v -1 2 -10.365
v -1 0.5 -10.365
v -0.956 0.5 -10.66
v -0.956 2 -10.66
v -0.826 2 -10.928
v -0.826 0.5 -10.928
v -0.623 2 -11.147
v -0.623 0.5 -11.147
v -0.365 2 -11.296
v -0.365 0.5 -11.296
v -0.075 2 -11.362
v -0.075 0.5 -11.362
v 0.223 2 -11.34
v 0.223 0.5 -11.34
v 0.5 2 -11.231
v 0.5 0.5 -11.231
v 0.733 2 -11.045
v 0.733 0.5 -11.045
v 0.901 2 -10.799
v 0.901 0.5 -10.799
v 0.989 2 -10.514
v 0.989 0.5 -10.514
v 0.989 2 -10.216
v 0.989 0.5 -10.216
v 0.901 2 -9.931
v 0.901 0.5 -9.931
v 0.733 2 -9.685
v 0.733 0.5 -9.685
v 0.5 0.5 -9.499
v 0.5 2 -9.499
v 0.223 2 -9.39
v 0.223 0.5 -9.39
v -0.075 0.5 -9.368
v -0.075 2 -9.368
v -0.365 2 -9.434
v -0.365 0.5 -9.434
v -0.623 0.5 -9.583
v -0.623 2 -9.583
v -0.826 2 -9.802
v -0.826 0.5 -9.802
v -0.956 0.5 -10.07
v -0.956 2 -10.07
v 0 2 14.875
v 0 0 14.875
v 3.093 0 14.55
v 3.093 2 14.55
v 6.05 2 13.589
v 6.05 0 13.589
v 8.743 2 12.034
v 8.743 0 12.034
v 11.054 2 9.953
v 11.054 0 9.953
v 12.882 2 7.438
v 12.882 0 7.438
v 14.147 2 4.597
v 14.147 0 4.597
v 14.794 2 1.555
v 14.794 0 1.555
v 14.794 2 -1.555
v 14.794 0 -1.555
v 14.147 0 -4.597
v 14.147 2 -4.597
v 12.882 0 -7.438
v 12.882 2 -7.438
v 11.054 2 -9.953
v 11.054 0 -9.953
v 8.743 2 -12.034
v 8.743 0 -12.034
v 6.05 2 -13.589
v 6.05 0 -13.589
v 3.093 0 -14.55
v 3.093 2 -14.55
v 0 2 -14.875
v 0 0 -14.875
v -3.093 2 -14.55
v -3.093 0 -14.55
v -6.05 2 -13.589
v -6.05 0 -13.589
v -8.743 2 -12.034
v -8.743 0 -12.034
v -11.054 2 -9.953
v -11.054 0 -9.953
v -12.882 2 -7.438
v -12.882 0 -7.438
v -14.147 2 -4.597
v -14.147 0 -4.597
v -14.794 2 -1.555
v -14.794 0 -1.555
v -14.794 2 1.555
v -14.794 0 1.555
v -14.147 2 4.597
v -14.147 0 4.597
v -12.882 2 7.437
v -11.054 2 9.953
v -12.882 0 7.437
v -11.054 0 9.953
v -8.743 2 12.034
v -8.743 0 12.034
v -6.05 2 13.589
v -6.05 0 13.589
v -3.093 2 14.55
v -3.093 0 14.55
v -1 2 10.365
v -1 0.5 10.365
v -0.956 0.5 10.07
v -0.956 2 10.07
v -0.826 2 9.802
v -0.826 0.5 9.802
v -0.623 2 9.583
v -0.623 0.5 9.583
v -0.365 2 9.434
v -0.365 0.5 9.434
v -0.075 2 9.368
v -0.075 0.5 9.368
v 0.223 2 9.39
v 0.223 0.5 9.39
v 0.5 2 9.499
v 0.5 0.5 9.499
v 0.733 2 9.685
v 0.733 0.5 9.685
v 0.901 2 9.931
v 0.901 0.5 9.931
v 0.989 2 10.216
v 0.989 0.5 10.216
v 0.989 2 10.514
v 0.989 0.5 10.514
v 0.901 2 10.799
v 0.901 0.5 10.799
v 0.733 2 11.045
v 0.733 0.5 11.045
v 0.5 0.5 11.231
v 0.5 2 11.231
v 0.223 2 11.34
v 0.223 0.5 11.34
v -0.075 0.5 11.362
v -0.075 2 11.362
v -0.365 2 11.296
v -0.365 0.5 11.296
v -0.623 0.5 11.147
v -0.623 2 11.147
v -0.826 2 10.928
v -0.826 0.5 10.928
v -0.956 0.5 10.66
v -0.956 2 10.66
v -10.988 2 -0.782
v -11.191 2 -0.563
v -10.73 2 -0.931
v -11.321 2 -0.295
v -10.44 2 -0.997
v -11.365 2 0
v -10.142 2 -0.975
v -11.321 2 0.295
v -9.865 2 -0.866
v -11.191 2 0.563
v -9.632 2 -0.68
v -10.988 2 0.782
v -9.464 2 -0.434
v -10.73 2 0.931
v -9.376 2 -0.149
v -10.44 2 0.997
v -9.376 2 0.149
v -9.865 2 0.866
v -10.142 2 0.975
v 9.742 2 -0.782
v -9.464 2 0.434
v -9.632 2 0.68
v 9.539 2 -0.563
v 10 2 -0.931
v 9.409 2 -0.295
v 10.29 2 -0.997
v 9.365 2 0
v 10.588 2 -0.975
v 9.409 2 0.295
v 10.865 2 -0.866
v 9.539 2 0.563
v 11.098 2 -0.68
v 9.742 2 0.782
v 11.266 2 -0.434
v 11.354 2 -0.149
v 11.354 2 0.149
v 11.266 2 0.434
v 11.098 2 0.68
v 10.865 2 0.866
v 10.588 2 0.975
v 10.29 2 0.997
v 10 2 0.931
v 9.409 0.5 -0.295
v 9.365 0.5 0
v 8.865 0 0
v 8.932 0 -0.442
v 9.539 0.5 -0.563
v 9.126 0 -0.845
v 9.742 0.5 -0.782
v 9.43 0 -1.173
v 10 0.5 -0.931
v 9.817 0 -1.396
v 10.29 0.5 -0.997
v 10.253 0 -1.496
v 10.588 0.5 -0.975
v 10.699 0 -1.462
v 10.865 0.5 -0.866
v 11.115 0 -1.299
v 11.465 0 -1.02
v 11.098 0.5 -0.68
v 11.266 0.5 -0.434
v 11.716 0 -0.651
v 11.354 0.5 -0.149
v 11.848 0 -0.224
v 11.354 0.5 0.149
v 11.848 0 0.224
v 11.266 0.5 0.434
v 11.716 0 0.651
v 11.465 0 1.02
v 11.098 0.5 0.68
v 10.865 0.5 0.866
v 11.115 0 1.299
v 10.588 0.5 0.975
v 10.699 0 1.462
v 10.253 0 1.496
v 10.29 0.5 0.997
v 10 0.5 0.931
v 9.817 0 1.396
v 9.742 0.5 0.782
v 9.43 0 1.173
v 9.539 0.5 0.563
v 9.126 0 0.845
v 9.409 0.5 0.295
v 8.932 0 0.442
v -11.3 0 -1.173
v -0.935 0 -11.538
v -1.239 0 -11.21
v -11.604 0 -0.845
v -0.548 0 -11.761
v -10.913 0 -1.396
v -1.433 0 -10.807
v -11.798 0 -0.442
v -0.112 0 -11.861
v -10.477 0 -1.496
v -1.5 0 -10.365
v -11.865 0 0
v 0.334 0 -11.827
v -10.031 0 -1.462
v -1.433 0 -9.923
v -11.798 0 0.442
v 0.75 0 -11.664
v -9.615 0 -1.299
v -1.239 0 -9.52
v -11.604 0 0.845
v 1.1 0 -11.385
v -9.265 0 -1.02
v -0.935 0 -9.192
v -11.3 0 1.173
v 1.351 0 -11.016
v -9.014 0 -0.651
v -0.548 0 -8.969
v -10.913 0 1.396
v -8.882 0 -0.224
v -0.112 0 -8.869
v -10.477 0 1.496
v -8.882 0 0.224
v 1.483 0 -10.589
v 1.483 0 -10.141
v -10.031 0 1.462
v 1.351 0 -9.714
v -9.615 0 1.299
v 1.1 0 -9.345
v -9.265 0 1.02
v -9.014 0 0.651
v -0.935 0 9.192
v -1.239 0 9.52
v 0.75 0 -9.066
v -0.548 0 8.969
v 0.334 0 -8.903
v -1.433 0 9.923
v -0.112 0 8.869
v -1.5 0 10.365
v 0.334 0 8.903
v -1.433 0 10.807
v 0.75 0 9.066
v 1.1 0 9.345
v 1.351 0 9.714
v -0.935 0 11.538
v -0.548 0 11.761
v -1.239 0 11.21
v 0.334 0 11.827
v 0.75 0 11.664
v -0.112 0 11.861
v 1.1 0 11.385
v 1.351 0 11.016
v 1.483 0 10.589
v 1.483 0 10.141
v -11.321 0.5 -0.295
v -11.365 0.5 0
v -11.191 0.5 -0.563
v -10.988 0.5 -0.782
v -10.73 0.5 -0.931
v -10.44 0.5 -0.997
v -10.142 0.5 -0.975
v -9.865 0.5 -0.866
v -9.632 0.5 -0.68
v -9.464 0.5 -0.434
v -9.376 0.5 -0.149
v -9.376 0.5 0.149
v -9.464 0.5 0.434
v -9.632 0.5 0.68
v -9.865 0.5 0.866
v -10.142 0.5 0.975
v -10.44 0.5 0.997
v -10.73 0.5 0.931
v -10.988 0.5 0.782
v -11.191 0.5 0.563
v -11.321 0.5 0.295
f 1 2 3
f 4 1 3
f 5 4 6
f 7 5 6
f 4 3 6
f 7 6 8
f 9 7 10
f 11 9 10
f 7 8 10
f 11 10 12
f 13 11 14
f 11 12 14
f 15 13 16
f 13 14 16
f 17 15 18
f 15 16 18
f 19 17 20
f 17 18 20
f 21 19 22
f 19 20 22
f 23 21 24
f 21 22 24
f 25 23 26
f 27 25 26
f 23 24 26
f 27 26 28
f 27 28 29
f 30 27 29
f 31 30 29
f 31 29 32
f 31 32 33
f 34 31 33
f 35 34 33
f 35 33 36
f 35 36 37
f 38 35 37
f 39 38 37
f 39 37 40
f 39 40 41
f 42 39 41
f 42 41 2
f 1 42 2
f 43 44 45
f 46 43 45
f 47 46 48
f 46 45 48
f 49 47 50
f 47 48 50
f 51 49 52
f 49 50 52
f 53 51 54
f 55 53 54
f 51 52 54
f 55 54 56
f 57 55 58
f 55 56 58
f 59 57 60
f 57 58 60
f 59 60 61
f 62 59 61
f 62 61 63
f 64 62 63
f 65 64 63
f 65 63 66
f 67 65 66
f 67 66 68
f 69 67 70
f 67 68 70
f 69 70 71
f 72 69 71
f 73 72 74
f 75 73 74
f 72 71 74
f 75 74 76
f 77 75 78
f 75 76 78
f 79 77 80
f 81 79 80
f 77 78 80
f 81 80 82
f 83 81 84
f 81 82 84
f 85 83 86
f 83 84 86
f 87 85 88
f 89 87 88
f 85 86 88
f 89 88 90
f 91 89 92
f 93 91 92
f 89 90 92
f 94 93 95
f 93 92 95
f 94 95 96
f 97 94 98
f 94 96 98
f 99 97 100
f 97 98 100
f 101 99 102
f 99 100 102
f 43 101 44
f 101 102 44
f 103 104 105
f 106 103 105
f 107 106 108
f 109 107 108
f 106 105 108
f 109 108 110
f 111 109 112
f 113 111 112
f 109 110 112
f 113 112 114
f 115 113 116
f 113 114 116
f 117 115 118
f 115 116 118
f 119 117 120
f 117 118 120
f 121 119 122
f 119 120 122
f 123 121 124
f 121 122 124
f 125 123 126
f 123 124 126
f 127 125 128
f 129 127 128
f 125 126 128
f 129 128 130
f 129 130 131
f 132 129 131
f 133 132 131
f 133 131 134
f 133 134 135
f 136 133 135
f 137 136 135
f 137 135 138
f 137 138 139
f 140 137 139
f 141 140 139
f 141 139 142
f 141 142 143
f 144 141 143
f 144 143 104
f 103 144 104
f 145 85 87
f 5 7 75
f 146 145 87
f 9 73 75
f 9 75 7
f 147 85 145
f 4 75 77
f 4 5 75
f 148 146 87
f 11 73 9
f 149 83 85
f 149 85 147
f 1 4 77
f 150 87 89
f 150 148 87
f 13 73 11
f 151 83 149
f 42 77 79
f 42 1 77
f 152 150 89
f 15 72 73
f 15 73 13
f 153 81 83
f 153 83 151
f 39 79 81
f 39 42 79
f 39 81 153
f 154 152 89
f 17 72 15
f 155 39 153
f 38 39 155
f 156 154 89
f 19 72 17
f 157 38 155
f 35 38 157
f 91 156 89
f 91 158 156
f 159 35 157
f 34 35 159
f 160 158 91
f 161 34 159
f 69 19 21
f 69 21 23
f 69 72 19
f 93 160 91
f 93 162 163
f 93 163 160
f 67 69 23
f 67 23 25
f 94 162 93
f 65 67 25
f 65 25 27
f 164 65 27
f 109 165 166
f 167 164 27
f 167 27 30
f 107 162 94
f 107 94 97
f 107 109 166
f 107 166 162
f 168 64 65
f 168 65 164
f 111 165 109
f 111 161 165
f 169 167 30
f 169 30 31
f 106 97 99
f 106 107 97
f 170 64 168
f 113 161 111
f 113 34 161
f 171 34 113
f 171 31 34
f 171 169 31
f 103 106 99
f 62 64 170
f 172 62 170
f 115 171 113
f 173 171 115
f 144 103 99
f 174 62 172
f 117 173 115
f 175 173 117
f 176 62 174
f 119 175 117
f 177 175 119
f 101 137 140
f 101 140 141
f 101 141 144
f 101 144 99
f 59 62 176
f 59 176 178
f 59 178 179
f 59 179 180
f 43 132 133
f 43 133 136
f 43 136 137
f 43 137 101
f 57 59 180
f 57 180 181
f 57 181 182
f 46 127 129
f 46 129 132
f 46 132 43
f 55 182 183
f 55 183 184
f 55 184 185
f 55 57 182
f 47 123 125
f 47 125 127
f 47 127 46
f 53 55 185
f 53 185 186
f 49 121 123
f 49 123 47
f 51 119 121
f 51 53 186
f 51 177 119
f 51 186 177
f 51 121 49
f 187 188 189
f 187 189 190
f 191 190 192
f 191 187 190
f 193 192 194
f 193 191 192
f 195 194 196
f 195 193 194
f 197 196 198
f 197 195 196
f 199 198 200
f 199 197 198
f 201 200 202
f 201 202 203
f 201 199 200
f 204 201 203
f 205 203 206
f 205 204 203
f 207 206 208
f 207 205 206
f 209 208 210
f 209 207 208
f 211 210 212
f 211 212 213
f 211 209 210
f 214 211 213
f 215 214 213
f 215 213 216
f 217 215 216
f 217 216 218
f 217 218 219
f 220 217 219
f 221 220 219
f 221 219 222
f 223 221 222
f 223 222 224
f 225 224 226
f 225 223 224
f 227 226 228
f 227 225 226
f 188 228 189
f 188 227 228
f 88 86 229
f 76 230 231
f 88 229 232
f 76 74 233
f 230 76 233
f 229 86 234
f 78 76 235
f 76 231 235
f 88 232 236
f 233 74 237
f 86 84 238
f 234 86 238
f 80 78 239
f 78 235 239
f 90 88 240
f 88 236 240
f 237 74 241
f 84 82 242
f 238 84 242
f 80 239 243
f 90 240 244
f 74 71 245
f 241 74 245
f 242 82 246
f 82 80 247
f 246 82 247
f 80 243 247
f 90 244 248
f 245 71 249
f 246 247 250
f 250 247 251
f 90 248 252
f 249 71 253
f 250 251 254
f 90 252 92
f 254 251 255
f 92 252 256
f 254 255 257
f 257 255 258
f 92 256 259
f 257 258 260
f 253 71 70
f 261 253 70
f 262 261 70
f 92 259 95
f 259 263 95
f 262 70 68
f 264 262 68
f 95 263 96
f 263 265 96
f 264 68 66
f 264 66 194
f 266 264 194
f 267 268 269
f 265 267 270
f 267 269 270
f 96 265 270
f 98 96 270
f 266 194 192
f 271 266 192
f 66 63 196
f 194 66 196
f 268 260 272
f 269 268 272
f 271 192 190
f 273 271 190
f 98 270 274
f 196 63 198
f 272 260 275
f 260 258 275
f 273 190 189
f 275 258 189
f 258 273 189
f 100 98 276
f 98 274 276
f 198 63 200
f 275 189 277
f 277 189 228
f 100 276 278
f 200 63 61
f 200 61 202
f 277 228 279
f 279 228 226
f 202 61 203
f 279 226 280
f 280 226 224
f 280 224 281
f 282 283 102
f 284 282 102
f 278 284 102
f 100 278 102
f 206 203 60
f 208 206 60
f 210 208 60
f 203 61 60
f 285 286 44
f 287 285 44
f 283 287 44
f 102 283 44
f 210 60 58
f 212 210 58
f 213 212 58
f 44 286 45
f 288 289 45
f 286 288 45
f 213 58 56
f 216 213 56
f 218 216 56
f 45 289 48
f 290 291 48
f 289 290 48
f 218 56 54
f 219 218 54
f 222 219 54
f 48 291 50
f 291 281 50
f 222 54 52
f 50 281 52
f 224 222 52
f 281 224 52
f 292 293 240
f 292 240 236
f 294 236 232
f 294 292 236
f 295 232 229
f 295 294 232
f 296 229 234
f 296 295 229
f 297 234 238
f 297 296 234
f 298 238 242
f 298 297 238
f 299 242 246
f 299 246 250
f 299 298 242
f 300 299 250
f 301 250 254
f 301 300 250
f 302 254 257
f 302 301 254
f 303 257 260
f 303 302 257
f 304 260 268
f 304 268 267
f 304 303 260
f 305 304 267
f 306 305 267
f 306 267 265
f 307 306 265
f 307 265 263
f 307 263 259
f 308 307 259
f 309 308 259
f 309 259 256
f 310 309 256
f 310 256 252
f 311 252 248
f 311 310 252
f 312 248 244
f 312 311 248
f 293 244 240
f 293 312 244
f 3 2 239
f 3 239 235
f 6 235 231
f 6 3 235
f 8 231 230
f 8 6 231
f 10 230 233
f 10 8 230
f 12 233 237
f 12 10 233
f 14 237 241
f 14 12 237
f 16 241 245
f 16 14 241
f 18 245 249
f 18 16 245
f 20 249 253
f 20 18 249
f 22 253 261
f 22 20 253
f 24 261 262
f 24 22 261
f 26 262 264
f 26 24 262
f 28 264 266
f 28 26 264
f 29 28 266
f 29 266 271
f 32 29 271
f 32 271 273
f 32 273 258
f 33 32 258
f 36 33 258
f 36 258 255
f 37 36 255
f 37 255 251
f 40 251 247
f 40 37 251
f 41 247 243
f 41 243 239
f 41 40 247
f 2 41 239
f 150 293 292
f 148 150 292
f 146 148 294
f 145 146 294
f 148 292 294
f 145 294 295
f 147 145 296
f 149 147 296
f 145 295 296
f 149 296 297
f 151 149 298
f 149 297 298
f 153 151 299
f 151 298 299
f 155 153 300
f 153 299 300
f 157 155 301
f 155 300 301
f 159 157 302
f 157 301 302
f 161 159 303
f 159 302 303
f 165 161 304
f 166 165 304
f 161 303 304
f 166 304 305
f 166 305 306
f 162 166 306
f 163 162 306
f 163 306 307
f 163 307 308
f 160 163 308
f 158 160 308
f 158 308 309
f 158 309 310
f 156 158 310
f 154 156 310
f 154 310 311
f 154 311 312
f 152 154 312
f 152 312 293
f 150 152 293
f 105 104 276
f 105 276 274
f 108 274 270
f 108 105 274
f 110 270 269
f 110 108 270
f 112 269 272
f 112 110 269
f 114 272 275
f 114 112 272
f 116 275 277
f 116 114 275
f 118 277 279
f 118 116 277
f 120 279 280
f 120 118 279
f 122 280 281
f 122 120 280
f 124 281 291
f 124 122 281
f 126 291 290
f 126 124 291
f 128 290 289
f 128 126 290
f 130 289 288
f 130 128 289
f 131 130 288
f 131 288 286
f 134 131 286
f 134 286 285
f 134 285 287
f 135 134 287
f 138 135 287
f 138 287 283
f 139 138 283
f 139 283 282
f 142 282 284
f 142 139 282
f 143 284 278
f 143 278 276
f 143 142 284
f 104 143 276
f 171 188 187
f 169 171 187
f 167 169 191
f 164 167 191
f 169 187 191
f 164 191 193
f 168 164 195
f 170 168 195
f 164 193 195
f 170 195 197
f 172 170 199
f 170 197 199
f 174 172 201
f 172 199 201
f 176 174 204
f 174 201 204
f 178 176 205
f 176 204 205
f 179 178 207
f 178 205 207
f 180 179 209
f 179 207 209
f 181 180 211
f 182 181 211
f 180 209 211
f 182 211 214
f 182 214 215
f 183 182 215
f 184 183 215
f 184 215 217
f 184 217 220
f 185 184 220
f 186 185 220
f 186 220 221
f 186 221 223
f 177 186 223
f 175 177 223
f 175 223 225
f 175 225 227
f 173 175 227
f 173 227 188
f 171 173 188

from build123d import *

# Parameters (mm, degrees)
SKETCH1_R                 = 14.875
BOSS_EXTRUDE1_DEPTH       = 2
F_2_0MM_DOWEL_HOLE1_D     = 2
F_2_0MM_DOWEL_HOLE1_DEPTH = 42.93
F_2_0MM_DOWEL_HOLE1_TIP   = 0.600860619
CHAMFER1_SIZE             = 0.5


with BuildPart() as part:
    # Sketch1 → Boss-Extrude1 (new body)
    with BuildSketch(Plane(origin=(0, 0, 0), x_dir=(1, 0, 0), z_dir=(0, 1, 0))):
        with Locations(Location((0, 0, 0), (0, 0, 270))):
            Circle(SKETCH1_R)
    extrude(amount=BOSS_EXTRUDE1_DEPTH)

    # Ø2.0mm Dowel Hole1
    with Locations(Plane(origin=(0, 2, 0), x_dir=(1, 0, 0), z_dir=(0, 1, 0))):
        with Locations((0, 10.365), (10.365, 0), (0, -10.365), (-10.365, 0)):
            Hole(F_2_0MM_DOWEL_HOLE1_D / 2, depth=F_2_0MM_DOWEL_HOLE1_DEPTH)
            with Locations((0, 0, -(F_2_0MM_DOWEL_HOLE1_DEPTH + F_2_0MM_DOWEL_HOLE1_TIP / 2))):  # 118° drill point
                Cone(0, F_2_0MM_DOWEL_HOLE1_D / 2, F_2_0MM_DOWEL_HOLE1_TIP, mode=Mode.SUBTRACT)

    # Chamfer1
    chamfer1_edges = [part.edges().sort_by_distance(p)[0] for p in [
        (1, 0, 10.365),
        (11.365, 0, 0),
        (1, 0, -10.365),
        (-9.365, 0, 0),
    ]]
    chamfer(chamfer1_edges, length=CHAMFER1_SIZE)


solid = part.part
